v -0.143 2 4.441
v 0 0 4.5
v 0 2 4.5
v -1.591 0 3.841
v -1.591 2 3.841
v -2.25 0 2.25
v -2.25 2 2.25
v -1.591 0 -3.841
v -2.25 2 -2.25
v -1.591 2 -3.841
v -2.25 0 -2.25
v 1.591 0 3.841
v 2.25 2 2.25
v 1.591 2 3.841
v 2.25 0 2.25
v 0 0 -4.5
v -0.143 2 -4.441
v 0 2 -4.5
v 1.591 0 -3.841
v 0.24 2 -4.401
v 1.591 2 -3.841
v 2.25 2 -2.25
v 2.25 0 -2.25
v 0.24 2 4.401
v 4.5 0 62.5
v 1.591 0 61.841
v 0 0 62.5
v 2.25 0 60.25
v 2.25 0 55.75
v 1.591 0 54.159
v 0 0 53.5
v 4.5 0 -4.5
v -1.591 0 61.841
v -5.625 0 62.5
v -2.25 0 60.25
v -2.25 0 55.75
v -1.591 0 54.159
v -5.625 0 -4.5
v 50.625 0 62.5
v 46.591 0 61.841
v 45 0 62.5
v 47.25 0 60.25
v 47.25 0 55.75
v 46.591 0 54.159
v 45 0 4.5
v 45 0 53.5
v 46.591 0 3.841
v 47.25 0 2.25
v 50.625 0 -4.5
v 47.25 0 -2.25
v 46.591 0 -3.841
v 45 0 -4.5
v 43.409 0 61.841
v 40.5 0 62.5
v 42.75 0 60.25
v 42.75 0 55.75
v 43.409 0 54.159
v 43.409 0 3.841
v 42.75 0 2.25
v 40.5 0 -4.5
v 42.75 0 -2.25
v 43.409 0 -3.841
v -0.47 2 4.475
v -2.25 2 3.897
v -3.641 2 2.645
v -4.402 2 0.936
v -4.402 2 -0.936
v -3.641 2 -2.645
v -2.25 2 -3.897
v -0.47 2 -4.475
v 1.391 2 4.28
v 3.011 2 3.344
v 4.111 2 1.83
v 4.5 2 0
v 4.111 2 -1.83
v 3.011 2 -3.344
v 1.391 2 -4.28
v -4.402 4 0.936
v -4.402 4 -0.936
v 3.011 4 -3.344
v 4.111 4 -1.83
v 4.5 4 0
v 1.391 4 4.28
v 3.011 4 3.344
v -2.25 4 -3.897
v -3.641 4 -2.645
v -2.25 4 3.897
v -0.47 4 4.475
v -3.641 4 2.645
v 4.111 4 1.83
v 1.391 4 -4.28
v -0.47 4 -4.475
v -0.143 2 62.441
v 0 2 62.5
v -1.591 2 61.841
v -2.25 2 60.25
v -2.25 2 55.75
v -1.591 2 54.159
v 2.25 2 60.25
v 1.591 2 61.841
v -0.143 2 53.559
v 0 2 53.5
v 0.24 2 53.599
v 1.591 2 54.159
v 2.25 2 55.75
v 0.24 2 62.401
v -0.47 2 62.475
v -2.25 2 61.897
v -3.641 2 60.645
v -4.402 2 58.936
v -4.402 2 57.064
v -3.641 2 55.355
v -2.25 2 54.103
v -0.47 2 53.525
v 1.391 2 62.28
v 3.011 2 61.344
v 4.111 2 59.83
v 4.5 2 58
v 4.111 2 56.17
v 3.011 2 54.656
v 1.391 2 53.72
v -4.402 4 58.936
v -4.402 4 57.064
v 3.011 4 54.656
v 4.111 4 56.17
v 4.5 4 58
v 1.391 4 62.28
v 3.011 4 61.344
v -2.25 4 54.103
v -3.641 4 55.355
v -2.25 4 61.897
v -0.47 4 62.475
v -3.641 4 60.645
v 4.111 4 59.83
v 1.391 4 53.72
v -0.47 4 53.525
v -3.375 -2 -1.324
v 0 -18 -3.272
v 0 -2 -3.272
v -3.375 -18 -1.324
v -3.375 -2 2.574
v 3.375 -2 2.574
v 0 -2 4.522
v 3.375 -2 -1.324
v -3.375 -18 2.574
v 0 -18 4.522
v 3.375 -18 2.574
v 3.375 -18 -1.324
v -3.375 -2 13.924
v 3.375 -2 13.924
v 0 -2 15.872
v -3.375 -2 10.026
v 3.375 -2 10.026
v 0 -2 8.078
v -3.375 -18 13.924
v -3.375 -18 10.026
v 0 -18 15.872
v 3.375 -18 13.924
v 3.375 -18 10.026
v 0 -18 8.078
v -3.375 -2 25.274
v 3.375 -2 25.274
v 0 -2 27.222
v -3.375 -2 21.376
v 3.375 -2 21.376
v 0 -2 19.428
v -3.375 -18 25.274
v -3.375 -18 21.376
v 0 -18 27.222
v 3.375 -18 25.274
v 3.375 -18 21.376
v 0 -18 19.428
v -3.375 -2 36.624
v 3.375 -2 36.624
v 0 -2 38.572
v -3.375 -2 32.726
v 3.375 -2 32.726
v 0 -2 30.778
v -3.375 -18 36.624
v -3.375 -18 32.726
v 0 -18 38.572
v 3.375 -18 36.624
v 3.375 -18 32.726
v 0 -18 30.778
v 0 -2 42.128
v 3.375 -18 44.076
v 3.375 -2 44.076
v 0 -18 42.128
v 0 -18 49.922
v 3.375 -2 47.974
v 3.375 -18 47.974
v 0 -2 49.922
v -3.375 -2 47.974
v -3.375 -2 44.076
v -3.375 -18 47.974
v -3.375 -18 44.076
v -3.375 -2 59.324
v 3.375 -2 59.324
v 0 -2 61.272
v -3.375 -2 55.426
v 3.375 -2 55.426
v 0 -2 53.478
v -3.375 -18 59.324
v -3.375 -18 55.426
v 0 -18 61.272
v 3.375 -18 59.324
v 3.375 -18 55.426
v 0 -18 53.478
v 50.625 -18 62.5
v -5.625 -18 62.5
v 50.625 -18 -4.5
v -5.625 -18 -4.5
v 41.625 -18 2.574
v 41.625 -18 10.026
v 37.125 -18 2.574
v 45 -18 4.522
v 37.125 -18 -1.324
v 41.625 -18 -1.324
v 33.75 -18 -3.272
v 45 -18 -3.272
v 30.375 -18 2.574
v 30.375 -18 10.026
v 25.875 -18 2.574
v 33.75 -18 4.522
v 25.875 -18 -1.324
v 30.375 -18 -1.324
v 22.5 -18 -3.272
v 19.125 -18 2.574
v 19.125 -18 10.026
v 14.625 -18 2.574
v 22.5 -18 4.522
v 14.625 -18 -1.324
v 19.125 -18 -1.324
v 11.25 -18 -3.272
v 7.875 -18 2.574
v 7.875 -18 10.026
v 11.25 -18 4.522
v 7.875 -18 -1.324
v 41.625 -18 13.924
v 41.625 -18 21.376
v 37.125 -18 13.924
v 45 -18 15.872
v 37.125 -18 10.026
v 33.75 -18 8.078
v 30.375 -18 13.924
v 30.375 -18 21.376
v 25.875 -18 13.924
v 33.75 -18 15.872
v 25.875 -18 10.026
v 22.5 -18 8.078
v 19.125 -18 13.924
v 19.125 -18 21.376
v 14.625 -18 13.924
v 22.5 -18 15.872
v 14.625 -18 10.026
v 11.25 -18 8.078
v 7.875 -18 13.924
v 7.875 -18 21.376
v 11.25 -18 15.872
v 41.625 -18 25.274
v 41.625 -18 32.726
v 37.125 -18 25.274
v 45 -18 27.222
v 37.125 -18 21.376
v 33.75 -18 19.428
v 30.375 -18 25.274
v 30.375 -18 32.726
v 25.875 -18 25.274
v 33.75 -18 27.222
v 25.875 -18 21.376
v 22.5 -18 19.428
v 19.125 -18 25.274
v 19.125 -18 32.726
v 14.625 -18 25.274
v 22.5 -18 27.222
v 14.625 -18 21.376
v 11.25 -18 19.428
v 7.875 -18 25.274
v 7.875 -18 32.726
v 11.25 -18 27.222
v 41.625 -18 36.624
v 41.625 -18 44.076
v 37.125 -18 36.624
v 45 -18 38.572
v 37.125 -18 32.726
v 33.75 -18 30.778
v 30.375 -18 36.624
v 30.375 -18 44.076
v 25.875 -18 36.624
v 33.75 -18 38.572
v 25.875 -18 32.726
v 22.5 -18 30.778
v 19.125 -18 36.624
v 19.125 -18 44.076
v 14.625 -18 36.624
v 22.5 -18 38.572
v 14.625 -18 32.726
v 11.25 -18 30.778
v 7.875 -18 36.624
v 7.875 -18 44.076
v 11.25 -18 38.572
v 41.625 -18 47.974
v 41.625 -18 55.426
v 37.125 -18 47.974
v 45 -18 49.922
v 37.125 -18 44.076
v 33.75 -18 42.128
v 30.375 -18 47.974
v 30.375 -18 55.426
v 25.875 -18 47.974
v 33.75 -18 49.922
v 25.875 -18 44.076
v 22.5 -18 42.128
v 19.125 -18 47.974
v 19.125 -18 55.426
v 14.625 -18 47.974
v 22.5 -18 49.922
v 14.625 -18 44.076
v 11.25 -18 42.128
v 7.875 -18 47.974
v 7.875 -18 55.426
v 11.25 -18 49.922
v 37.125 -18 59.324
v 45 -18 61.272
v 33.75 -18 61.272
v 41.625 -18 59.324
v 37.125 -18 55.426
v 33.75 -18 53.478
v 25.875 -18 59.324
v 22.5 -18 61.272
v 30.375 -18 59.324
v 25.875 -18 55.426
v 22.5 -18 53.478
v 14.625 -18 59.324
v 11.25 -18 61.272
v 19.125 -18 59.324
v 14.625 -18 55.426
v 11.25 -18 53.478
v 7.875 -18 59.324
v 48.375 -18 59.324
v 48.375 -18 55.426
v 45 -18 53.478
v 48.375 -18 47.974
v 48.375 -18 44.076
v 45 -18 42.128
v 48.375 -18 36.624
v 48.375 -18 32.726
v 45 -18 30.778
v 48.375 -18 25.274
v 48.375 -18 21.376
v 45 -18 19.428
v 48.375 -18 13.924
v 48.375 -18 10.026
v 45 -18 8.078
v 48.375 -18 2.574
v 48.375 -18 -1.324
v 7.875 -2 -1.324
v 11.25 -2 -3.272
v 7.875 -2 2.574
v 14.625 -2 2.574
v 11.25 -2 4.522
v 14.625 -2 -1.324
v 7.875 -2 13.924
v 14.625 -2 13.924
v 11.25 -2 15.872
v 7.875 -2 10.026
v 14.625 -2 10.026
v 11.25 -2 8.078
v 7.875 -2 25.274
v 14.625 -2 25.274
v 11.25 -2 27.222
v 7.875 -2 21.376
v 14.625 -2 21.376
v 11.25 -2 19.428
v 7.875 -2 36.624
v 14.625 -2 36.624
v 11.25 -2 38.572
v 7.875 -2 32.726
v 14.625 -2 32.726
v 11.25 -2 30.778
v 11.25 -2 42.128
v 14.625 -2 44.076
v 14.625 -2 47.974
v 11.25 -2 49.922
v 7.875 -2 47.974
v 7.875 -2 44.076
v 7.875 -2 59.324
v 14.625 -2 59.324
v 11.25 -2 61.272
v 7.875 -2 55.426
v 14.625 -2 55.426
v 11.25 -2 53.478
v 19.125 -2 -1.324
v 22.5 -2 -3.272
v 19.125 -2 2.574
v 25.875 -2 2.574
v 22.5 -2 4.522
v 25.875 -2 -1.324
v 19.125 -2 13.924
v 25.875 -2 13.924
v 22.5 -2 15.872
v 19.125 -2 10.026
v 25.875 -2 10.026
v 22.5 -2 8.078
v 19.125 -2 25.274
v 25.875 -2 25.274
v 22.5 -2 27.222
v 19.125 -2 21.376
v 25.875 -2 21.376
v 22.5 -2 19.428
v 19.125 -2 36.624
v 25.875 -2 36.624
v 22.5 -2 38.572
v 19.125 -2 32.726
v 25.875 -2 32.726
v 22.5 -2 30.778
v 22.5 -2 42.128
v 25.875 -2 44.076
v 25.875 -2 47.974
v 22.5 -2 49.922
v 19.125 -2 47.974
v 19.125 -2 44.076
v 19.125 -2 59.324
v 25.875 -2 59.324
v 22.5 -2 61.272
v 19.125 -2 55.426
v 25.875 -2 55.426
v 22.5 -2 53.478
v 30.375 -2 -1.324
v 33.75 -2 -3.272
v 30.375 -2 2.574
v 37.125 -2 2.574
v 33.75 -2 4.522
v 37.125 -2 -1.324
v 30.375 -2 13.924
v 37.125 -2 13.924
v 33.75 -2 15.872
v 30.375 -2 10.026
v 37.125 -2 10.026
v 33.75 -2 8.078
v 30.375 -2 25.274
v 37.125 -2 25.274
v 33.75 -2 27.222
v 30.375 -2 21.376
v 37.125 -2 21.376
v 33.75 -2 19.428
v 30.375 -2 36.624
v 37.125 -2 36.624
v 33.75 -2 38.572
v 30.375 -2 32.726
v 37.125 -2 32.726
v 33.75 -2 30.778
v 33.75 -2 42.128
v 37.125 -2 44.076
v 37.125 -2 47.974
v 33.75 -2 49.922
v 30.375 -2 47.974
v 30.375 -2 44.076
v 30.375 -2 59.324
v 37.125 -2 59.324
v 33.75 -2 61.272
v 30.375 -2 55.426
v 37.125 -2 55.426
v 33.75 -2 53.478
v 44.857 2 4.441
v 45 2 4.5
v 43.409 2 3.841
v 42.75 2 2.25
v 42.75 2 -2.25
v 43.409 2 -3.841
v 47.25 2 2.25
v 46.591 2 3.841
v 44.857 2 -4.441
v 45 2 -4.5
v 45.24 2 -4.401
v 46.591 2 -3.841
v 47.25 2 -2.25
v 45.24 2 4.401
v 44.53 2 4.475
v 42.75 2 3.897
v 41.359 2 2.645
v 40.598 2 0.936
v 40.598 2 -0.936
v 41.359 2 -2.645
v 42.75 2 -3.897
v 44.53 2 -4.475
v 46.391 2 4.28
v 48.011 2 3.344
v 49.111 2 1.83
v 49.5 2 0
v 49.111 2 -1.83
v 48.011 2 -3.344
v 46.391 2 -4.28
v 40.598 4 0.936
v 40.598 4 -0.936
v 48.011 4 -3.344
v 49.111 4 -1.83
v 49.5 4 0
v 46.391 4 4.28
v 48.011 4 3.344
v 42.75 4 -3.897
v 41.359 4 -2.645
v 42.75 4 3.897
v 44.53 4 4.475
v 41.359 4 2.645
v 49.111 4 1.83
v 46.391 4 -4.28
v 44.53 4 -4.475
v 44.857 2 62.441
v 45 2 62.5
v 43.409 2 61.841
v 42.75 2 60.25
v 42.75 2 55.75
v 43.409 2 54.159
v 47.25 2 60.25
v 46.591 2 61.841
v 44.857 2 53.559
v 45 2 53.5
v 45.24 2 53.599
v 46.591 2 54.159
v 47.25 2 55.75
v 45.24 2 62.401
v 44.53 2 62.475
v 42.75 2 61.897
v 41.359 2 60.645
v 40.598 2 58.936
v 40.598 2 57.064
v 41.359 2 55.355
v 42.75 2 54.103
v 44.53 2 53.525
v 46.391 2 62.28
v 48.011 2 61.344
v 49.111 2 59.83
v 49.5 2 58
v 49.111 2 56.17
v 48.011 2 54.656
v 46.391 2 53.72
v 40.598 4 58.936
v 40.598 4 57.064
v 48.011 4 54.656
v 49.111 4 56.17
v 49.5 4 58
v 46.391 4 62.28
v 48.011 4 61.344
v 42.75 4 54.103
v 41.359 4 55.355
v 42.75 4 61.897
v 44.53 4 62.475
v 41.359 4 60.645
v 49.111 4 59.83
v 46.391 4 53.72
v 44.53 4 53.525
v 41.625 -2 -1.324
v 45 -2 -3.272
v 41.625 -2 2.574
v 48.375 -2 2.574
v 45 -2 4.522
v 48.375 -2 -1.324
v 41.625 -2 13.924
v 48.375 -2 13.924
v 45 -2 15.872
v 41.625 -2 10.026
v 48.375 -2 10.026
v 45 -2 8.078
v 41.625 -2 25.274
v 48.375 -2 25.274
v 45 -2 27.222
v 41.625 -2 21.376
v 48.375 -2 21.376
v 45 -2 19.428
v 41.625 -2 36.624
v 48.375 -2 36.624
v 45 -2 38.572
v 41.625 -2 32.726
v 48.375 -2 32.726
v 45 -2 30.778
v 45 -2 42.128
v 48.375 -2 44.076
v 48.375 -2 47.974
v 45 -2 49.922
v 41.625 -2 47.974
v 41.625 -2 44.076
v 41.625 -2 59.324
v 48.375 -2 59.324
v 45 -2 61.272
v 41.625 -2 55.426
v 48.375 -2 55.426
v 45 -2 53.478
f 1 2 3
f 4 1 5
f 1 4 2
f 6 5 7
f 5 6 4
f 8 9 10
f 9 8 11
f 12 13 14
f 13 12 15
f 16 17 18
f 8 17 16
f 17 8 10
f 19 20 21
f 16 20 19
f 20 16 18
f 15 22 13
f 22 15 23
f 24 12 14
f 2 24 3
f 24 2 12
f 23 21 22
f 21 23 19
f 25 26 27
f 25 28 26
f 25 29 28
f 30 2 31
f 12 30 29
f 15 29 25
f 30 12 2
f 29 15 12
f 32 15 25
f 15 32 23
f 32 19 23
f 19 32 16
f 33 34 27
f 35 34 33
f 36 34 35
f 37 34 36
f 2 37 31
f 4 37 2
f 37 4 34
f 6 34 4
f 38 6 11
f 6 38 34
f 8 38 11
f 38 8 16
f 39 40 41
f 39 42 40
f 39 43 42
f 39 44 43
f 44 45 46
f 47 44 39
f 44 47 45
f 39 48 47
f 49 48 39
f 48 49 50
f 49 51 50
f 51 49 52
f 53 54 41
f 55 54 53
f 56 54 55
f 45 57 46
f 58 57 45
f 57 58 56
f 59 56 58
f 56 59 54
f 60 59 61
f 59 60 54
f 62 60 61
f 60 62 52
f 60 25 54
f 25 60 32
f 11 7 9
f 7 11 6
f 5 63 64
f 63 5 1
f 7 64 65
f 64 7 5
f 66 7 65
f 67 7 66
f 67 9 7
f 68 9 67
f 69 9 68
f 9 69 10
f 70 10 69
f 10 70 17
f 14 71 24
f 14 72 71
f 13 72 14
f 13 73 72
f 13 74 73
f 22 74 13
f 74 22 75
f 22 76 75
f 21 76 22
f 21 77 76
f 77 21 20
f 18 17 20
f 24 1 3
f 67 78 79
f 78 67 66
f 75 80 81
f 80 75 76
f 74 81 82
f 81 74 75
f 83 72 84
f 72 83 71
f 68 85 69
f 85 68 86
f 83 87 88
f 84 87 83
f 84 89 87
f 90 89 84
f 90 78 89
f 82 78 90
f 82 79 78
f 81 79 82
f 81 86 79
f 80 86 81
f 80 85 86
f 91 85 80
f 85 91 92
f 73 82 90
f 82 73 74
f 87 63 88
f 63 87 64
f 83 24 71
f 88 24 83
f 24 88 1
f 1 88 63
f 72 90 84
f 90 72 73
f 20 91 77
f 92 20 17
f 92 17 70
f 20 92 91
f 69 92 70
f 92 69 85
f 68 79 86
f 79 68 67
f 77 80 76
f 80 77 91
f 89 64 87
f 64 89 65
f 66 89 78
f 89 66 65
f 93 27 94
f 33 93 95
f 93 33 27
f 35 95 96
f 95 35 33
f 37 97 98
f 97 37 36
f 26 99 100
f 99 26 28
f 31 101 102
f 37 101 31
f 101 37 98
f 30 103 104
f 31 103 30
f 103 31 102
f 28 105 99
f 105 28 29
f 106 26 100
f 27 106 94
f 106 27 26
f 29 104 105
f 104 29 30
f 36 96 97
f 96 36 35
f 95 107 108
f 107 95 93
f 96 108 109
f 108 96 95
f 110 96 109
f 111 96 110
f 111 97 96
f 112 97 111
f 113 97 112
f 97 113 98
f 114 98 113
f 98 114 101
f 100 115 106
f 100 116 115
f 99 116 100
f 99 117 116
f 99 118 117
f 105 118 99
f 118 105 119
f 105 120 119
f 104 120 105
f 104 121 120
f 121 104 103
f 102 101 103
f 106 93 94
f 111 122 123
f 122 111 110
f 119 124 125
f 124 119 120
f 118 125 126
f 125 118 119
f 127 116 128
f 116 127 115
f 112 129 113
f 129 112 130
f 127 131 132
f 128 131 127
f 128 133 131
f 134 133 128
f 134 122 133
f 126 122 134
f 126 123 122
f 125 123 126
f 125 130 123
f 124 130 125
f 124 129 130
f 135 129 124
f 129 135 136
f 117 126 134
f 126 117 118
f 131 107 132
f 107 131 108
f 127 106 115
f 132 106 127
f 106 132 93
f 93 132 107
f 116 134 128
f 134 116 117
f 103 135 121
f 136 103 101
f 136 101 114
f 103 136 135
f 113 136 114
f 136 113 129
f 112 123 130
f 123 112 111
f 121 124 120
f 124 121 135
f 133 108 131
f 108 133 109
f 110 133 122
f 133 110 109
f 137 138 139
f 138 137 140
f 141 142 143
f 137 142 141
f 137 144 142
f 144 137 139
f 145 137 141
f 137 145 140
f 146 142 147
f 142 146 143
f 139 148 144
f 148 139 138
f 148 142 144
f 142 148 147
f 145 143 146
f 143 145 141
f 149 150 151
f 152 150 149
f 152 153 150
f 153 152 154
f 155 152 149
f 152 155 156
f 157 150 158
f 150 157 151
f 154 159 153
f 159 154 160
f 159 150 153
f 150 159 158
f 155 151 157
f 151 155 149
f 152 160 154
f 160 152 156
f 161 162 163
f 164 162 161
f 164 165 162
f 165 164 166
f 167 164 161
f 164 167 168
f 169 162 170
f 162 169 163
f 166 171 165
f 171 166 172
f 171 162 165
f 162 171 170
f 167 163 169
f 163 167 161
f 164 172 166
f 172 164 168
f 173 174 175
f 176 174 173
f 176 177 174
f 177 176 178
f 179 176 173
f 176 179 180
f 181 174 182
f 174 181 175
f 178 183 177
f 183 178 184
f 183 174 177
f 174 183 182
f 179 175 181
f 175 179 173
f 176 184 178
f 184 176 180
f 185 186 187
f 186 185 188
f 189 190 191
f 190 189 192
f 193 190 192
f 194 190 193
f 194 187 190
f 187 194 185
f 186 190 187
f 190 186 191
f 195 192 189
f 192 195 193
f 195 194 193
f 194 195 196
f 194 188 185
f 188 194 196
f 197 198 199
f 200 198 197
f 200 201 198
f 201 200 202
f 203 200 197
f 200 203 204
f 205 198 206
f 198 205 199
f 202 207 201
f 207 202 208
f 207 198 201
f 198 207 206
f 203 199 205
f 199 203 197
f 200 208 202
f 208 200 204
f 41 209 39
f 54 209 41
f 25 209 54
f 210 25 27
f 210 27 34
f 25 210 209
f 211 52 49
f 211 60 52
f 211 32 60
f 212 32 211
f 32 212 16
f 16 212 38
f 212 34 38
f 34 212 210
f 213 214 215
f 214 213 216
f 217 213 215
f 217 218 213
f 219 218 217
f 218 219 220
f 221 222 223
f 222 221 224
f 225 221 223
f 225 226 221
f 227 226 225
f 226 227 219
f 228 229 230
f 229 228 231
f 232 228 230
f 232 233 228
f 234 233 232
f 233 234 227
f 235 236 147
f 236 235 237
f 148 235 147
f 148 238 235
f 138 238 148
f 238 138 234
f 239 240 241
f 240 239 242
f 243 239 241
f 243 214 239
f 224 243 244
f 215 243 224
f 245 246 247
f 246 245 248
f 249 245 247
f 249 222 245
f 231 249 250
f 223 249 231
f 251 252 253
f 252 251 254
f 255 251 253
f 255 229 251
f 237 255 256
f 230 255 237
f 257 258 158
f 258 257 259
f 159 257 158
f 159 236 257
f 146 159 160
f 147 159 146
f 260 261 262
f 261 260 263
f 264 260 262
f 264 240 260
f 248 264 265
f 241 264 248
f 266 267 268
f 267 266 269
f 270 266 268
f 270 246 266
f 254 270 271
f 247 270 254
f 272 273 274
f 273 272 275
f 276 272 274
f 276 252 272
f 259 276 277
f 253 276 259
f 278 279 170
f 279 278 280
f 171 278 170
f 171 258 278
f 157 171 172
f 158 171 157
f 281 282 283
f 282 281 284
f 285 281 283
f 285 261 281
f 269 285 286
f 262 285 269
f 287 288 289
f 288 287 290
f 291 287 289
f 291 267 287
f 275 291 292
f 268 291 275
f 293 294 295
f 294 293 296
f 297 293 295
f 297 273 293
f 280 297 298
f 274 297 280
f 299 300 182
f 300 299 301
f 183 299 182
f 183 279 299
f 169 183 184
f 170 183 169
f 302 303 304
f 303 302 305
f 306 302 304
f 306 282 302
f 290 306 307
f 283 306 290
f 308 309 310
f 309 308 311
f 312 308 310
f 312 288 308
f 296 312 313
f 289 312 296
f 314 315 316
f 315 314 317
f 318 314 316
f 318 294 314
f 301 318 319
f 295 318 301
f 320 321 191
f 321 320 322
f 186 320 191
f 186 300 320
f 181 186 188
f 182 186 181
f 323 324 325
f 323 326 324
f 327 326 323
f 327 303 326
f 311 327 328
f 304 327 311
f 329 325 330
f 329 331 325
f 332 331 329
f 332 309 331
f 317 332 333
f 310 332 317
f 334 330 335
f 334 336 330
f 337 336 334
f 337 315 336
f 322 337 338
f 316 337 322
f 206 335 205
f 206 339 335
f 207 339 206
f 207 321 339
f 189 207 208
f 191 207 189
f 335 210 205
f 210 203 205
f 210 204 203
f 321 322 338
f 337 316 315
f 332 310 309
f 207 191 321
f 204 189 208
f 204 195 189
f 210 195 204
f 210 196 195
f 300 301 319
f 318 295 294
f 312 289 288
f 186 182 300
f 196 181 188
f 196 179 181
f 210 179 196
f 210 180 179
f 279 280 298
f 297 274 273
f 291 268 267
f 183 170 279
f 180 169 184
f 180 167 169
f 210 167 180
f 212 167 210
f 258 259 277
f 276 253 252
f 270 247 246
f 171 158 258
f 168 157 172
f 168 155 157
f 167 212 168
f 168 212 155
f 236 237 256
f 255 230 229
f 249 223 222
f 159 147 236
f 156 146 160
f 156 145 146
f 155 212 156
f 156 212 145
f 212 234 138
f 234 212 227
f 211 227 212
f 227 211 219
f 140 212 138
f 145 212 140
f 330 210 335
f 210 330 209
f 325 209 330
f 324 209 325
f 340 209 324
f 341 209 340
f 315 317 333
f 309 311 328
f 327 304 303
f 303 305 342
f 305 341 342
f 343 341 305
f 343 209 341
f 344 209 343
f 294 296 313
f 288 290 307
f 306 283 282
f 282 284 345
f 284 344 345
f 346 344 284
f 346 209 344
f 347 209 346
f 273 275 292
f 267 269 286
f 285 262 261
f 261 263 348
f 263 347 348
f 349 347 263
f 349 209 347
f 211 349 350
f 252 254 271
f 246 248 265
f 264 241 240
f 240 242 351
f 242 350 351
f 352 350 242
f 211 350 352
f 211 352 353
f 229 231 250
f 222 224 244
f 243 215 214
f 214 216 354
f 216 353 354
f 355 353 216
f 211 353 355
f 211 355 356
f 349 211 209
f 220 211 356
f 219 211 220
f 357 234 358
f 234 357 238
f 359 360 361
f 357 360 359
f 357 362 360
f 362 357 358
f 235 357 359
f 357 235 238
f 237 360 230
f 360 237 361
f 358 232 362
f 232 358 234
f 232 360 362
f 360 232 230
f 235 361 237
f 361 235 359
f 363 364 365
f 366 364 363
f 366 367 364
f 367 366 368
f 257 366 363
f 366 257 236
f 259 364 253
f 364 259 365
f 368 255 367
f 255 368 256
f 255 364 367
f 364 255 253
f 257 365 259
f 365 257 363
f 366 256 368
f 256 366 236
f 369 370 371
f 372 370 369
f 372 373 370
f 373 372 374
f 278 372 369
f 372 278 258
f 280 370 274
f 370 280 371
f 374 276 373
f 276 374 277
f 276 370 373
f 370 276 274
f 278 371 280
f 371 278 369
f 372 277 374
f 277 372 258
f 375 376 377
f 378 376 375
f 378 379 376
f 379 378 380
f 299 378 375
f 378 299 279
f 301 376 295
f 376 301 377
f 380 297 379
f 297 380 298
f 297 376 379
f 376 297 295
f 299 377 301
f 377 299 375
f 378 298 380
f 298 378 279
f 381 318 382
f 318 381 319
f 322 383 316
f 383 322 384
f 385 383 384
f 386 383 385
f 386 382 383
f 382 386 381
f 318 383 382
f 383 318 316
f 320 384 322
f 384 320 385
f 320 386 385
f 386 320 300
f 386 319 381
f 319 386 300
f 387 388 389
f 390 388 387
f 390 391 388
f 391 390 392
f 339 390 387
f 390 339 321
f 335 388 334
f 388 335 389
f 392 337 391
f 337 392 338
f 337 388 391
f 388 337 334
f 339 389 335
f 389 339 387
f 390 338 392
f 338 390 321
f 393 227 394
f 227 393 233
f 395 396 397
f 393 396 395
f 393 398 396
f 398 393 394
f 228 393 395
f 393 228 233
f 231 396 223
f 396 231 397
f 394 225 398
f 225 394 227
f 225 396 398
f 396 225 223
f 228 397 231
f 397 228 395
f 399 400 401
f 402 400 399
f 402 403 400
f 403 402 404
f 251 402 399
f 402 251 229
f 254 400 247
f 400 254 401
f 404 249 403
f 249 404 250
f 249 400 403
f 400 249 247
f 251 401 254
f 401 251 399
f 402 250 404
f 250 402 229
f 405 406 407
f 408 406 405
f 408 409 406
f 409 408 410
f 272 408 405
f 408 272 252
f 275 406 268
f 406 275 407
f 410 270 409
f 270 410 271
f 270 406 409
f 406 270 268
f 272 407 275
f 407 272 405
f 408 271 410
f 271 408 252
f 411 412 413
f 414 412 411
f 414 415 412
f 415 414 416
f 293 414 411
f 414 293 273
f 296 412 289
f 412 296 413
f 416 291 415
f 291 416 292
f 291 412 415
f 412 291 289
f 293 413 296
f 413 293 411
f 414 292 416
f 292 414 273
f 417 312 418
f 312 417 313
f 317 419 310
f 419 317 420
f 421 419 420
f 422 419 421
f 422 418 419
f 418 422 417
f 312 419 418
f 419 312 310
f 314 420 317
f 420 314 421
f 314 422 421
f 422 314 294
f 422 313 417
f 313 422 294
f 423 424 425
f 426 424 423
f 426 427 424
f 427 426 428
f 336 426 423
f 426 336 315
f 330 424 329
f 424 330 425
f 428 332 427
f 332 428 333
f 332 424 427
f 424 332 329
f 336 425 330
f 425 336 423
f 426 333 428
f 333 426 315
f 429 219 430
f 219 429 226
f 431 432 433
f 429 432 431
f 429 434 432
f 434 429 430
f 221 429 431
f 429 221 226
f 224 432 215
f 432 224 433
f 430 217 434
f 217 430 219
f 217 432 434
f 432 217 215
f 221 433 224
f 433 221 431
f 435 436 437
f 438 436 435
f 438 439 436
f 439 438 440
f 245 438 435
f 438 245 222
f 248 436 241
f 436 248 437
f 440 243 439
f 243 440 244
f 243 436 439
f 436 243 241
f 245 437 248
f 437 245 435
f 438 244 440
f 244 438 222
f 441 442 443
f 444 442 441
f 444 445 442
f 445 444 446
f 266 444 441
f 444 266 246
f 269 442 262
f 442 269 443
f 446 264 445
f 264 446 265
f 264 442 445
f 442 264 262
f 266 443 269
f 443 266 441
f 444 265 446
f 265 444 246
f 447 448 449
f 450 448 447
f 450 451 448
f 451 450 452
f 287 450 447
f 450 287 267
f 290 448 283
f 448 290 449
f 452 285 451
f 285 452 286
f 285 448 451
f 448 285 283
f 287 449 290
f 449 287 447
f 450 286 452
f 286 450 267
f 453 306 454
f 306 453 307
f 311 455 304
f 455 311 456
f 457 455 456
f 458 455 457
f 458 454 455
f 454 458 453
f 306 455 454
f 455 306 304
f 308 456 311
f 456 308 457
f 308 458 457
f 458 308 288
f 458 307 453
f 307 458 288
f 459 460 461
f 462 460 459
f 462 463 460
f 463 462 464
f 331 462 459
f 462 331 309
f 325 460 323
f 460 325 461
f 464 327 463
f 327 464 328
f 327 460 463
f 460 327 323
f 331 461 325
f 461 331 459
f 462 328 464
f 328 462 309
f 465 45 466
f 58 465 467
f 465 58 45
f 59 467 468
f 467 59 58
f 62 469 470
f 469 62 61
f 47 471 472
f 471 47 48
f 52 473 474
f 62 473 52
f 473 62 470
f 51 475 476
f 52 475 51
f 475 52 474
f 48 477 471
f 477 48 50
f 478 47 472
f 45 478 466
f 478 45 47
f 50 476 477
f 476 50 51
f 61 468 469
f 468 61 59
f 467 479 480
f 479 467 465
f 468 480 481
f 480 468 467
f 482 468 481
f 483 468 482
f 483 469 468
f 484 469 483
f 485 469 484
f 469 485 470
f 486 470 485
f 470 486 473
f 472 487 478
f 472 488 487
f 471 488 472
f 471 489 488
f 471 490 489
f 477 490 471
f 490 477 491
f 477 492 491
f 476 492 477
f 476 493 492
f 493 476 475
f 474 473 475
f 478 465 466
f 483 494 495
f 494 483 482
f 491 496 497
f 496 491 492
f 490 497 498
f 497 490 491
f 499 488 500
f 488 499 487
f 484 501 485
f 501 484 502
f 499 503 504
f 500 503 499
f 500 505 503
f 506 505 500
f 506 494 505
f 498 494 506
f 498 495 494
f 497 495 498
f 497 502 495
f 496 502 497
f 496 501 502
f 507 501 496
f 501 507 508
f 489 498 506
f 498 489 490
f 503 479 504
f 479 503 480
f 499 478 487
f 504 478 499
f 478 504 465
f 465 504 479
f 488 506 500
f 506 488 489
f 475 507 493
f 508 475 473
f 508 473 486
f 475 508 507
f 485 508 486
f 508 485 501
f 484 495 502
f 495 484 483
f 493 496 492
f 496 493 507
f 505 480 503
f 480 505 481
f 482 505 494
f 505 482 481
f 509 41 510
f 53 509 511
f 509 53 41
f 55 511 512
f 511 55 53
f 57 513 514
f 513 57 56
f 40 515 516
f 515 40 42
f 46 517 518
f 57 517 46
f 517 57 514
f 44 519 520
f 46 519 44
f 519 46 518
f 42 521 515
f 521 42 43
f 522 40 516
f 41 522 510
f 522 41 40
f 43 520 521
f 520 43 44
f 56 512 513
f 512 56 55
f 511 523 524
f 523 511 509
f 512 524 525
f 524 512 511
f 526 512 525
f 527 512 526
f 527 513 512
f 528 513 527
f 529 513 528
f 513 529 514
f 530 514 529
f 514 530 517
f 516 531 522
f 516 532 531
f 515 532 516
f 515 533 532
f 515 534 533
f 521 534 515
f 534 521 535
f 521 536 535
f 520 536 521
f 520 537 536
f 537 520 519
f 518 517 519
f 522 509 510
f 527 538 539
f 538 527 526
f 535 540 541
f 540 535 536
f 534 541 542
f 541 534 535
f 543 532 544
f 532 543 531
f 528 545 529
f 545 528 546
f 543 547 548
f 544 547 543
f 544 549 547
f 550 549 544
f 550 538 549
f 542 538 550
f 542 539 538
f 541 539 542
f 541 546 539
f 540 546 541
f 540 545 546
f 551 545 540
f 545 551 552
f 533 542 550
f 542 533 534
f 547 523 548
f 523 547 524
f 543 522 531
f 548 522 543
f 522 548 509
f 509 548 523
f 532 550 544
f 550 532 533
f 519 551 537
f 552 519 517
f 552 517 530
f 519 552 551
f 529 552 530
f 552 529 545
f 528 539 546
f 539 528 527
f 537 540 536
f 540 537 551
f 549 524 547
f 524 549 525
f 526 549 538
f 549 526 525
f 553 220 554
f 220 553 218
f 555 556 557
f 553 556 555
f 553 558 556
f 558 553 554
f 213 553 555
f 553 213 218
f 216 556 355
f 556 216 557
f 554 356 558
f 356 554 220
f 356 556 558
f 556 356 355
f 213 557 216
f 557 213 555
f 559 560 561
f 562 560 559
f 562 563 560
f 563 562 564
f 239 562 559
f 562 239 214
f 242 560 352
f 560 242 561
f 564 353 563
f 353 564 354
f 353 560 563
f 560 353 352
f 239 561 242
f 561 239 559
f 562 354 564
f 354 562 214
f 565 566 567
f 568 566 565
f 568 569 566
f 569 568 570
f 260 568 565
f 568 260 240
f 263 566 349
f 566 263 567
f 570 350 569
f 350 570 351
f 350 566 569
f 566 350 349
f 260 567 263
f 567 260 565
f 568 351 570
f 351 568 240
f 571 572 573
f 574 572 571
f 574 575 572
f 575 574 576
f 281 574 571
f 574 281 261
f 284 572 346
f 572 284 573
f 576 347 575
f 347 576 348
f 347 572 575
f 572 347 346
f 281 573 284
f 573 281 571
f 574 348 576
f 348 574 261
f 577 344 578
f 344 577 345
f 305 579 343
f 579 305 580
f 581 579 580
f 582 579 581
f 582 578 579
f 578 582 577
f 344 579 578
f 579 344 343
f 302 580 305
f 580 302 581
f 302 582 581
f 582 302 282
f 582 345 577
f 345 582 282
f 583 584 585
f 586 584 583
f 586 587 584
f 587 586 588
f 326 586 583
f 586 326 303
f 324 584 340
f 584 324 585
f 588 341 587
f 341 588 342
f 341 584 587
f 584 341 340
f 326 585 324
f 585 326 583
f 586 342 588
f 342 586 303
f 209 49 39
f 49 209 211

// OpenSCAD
// file: peg.scad
pegSlot = 5; // the small opening it slides into
pegD = 9;    // the large opening to put it into
pegH = 22;   // top of large opening to bottom of small opening

holeD = 3.75; // "screw" holes

holeSpacingX = 15;
holeSpacingY = 14.5; // yes, this is actually not a grid. go figure
pegSpacingX = 3 * holeSpacingX;
pegSpacingY = 4 * holeSpacingY;

module peg(t = 2, clearance = 2)
{
    D = pegD;
    d = 4.5;

    rotate([ -90, 0, 0 ])
    {
        hull()
        {
            translate([ 0, (D - d) / 2, 0 ]) cylinder(h = clearance, d = d);
            translate([ 0, -(D - d) / 2, 0 ]) cylinder(h = clearance, d = d);
        }
        translate([ 0, 0, clearance ]) cylinder(h = t, d = D);
    }
}

module pegs(n, t = 2, clearance = 2)
{
    pegSpacingX = 45;
    x0 = ((1 - n) * pegSpacingX) / 2;
    for (i = [0:(n - 1)])
    {
        translate([ x0 + i * pegSpacingX, 0, 0 ]) peg(t, clearance);
    }
}
// file: hexHolder.scad
include <peg.scad>;

function subsum(list, i, n) = i < n ? list[i] + subsum(list, i + 1, n) : 0;

module hexHolder(radiuses, pegs, spacing, depth, margin, t, pegSpacing, width = pegD)
{
    hole = (25.4 / 4 + 2 * margin) * 2 / sqrt(3);
    H = t + depth;

    l = subsum(radiuses, 0, len(radiuses)) + spacing * (len(radiuses) - 1) - radiuses[0] / 2 -
        radiuses[len(radiuses) - 1] / 2;
    L = pegD + (pegs - 1) * pegSpacing;

    difference()
    {
        translate([ -width / 2, -H, -pegD / 2 ]) cube([ width, H, L ]);

        for (i = [0:len(radiuses) - 1])
        {
            z = (L - l) / 2 - pegD / 2 - radiuses[0] / 2 + i * spacing + subsum(radiuses, 0, i + 1) - radiuses[i] / 2;
            translate([ 0, -t, z ]) rotate([ 90, 90, 0 ]) cylinder(h = H, d = hole, $fn = 6);
        }
    }
}

module verticalHexHolder(radiuses, pegs, spacing = 5, depth = 16, margin = 0.2, t = 2, width=pegD)
{
    for (i = [0:pegs - 1])
        translate([ 0, 0, i * pegSpacingY ]) peg(t);
    hexHolder(radiuses, pegs, spacing, depth, margin, t, pegSpacingY, width);
}

module horizontalHexHolder(radiuses, pegs, spacing = 5, depth = 16, margin = 0.2, t = 2, width = pegD)
{
    for (i = [0:pegs - 1])
        translate([ i * pegSpacingX, 0, 0]) peg(t);
    rotate([0,90,0]) hexHolder(radiuses, pegs, spacing, depth, margin, t, pegSpacingX, width);
}
// main file
include<hexHolder.scad>;
difference()
{
    for (i = [0:4])
    {
        translate([ i / 4 * pegSpacingX, 0, 0 ])
            verticalHexHolder([ 6.35, 6.35, 6.35, 6.35, 6.35, 6.35 ], 2, width = pegSpacingX / 4);
    }
    translate([ pegD / 2, 0, -.01 - pegD / 2 ]) cube([ pegSpacingX - pegD, 10, pegD + pegSpacingY + .02 ]);
}
